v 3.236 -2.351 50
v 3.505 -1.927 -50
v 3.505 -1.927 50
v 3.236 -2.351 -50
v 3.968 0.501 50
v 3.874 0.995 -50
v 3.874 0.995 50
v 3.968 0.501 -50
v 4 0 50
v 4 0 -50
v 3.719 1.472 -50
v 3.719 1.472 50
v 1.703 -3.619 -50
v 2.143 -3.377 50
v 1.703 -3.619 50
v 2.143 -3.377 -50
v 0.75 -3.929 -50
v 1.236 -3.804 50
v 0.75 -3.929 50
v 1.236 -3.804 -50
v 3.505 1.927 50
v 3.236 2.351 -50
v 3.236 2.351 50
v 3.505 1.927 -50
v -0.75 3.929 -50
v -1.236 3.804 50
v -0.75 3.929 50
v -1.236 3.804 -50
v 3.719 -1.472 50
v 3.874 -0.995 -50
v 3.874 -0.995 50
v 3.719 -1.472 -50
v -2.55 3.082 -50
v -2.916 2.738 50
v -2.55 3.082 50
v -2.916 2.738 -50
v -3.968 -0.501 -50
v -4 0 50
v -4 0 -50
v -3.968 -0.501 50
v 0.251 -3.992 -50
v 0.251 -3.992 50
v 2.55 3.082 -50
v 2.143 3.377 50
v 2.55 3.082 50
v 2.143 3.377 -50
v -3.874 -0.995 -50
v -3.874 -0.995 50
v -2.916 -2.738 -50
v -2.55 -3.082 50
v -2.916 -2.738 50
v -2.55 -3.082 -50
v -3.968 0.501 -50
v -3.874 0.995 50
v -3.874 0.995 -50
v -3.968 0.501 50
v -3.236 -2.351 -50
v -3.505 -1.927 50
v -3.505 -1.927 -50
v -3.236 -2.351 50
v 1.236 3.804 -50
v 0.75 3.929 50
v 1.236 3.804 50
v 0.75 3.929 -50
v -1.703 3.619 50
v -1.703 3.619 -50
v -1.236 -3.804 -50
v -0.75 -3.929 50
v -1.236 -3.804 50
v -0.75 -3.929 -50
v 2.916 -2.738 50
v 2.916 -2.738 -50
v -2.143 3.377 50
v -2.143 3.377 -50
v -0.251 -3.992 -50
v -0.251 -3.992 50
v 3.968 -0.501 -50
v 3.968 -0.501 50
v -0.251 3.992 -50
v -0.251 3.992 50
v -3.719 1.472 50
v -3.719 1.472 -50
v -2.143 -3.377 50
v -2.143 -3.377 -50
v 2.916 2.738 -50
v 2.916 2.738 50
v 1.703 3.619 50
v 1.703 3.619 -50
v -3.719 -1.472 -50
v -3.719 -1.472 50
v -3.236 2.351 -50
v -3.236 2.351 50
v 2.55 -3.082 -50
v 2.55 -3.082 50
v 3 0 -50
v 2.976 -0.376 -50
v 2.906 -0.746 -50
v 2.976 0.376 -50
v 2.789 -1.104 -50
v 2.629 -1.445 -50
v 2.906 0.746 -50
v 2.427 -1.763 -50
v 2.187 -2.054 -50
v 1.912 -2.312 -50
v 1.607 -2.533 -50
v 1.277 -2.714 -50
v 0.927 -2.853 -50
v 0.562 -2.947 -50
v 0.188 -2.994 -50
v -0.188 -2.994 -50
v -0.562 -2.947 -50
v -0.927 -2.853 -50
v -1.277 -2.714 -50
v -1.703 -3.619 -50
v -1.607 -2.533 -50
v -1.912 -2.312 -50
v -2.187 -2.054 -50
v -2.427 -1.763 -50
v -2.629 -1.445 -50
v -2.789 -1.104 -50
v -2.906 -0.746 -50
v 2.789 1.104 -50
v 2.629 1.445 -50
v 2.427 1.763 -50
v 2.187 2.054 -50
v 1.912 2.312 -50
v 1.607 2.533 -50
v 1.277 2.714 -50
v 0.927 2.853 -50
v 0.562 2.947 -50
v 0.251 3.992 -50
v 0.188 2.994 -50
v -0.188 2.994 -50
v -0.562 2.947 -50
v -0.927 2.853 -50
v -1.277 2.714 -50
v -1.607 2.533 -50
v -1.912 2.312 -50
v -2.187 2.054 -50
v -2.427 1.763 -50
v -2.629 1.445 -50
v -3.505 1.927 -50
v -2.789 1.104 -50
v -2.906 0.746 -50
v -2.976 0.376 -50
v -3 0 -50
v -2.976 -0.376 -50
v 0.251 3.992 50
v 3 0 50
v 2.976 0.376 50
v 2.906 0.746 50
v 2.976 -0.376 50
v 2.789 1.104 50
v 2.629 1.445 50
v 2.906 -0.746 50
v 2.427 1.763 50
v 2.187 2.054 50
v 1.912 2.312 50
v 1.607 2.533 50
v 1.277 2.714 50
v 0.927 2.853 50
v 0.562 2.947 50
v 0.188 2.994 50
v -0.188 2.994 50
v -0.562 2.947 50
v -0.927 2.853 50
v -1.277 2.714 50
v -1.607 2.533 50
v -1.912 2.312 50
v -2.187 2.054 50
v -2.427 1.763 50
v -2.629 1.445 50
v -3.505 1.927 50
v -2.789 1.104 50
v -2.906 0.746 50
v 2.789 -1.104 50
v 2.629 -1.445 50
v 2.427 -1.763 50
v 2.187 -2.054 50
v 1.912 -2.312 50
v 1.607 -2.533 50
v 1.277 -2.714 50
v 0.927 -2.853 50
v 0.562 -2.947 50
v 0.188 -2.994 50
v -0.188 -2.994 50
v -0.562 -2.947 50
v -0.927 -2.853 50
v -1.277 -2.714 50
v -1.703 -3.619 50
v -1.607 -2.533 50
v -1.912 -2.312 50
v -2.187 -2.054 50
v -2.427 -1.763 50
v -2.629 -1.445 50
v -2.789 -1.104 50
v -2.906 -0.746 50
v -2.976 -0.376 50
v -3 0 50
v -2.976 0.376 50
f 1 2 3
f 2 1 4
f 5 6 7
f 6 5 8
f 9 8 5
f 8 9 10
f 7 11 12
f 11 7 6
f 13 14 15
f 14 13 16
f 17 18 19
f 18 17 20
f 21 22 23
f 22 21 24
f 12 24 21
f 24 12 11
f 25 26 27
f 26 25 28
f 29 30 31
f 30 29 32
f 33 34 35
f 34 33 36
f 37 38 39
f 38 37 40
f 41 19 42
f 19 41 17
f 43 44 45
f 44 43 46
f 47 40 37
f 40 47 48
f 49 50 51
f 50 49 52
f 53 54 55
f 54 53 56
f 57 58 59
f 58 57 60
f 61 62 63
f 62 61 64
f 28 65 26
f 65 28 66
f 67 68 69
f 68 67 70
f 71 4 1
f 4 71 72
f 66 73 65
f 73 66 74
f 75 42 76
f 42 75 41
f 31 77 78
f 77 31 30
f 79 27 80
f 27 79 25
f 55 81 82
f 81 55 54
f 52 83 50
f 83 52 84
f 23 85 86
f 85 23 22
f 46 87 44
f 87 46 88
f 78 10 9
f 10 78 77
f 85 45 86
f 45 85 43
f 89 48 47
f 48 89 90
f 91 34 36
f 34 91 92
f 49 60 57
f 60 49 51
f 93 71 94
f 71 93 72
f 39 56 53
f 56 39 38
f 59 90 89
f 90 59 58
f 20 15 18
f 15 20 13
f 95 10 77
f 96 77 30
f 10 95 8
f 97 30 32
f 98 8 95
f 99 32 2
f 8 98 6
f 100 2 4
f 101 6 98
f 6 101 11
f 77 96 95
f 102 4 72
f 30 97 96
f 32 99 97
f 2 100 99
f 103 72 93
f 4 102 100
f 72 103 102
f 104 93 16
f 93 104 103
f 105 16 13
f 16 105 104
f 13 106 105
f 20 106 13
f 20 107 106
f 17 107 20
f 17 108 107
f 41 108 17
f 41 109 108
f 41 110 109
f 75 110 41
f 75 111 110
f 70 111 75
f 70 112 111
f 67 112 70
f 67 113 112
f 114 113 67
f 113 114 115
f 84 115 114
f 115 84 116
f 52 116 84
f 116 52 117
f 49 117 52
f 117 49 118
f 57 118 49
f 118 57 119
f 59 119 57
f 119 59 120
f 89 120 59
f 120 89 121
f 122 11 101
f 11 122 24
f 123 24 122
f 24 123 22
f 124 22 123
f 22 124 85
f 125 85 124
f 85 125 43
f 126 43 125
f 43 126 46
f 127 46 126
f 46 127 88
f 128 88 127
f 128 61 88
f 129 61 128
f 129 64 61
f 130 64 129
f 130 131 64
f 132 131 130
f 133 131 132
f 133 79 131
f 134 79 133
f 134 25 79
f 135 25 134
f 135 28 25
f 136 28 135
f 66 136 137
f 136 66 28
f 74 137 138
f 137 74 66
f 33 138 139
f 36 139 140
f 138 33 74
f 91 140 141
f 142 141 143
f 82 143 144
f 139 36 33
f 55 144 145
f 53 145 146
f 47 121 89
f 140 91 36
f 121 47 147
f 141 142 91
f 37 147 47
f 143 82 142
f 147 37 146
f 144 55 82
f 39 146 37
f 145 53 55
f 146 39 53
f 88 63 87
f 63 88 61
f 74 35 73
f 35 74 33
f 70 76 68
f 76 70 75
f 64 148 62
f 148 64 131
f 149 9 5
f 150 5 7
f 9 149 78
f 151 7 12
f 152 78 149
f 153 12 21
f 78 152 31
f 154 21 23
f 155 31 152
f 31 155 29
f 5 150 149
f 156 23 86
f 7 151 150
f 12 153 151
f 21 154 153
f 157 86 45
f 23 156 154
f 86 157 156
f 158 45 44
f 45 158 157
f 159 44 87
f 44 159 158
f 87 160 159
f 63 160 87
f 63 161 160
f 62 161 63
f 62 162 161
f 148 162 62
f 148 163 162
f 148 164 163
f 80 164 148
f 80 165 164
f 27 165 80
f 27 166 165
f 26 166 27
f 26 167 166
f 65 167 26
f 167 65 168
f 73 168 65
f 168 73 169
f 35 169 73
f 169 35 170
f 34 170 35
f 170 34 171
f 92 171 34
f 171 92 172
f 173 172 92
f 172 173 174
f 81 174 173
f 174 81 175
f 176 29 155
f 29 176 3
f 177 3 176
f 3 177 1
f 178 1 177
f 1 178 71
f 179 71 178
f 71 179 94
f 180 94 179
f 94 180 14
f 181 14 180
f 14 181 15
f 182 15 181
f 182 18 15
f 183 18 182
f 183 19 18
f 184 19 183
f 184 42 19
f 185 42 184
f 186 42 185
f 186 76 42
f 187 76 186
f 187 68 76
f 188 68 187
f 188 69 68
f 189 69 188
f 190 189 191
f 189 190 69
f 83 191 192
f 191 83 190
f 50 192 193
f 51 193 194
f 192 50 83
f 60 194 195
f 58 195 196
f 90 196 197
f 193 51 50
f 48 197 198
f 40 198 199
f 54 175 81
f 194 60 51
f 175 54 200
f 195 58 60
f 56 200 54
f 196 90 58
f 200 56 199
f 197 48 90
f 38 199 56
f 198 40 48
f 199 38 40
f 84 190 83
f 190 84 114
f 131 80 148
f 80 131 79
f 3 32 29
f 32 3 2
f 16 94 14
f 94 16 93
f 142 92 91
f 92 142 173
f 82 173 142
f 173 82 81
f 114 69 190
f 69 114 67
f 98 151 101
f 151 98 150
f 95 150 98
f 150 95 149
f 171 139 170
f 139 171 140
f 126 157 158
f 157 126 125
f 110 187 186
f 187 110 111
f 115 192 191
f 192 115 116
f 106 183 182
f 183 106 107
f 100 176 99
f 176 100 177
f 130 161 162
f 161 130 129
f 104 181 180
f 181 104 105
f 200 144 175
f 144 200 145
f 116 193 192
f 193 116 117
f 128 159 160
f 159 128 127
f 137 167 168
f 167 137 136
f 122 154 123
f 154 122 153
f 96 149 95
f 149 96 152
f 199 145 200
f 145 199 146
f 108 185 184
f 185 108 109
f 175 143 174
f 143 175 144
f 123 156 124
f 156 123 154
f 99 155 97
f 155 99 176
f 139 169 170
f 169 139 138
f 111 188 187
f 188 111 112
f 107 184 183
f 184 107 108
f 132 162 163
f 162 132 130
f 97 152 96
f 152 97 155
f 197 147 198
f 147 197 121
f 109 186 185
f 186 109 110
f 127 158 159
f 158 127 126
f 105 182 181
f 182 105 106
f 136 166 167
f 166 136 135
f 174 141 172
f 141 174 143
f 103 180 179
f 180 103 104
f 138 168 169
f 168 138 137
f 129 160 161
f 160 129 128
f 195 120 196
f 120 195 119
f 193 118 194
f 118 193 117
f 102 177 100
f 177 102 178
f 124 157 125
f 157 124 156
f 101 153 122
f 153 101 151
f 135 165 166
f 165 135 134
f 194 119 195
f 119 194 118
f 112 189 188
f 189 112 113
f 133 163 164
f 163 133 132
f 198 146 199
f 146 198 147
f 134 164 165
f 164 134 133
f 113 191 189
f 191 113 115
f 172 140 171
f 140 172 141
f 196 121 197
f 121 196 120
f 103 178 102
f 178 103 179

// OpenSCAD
$fn = 50;


difference() {
	union() {
		translate(v = [0, 0, -50.0000000000]) {
			cylinder(h = 100, r = 4.0000000000);
		}
	}
	union() {
		translate(v = [0, 0, -100.0000000000]) {
			cylinder(h = 200, r = 3.0000000000);
		}
	}
}
